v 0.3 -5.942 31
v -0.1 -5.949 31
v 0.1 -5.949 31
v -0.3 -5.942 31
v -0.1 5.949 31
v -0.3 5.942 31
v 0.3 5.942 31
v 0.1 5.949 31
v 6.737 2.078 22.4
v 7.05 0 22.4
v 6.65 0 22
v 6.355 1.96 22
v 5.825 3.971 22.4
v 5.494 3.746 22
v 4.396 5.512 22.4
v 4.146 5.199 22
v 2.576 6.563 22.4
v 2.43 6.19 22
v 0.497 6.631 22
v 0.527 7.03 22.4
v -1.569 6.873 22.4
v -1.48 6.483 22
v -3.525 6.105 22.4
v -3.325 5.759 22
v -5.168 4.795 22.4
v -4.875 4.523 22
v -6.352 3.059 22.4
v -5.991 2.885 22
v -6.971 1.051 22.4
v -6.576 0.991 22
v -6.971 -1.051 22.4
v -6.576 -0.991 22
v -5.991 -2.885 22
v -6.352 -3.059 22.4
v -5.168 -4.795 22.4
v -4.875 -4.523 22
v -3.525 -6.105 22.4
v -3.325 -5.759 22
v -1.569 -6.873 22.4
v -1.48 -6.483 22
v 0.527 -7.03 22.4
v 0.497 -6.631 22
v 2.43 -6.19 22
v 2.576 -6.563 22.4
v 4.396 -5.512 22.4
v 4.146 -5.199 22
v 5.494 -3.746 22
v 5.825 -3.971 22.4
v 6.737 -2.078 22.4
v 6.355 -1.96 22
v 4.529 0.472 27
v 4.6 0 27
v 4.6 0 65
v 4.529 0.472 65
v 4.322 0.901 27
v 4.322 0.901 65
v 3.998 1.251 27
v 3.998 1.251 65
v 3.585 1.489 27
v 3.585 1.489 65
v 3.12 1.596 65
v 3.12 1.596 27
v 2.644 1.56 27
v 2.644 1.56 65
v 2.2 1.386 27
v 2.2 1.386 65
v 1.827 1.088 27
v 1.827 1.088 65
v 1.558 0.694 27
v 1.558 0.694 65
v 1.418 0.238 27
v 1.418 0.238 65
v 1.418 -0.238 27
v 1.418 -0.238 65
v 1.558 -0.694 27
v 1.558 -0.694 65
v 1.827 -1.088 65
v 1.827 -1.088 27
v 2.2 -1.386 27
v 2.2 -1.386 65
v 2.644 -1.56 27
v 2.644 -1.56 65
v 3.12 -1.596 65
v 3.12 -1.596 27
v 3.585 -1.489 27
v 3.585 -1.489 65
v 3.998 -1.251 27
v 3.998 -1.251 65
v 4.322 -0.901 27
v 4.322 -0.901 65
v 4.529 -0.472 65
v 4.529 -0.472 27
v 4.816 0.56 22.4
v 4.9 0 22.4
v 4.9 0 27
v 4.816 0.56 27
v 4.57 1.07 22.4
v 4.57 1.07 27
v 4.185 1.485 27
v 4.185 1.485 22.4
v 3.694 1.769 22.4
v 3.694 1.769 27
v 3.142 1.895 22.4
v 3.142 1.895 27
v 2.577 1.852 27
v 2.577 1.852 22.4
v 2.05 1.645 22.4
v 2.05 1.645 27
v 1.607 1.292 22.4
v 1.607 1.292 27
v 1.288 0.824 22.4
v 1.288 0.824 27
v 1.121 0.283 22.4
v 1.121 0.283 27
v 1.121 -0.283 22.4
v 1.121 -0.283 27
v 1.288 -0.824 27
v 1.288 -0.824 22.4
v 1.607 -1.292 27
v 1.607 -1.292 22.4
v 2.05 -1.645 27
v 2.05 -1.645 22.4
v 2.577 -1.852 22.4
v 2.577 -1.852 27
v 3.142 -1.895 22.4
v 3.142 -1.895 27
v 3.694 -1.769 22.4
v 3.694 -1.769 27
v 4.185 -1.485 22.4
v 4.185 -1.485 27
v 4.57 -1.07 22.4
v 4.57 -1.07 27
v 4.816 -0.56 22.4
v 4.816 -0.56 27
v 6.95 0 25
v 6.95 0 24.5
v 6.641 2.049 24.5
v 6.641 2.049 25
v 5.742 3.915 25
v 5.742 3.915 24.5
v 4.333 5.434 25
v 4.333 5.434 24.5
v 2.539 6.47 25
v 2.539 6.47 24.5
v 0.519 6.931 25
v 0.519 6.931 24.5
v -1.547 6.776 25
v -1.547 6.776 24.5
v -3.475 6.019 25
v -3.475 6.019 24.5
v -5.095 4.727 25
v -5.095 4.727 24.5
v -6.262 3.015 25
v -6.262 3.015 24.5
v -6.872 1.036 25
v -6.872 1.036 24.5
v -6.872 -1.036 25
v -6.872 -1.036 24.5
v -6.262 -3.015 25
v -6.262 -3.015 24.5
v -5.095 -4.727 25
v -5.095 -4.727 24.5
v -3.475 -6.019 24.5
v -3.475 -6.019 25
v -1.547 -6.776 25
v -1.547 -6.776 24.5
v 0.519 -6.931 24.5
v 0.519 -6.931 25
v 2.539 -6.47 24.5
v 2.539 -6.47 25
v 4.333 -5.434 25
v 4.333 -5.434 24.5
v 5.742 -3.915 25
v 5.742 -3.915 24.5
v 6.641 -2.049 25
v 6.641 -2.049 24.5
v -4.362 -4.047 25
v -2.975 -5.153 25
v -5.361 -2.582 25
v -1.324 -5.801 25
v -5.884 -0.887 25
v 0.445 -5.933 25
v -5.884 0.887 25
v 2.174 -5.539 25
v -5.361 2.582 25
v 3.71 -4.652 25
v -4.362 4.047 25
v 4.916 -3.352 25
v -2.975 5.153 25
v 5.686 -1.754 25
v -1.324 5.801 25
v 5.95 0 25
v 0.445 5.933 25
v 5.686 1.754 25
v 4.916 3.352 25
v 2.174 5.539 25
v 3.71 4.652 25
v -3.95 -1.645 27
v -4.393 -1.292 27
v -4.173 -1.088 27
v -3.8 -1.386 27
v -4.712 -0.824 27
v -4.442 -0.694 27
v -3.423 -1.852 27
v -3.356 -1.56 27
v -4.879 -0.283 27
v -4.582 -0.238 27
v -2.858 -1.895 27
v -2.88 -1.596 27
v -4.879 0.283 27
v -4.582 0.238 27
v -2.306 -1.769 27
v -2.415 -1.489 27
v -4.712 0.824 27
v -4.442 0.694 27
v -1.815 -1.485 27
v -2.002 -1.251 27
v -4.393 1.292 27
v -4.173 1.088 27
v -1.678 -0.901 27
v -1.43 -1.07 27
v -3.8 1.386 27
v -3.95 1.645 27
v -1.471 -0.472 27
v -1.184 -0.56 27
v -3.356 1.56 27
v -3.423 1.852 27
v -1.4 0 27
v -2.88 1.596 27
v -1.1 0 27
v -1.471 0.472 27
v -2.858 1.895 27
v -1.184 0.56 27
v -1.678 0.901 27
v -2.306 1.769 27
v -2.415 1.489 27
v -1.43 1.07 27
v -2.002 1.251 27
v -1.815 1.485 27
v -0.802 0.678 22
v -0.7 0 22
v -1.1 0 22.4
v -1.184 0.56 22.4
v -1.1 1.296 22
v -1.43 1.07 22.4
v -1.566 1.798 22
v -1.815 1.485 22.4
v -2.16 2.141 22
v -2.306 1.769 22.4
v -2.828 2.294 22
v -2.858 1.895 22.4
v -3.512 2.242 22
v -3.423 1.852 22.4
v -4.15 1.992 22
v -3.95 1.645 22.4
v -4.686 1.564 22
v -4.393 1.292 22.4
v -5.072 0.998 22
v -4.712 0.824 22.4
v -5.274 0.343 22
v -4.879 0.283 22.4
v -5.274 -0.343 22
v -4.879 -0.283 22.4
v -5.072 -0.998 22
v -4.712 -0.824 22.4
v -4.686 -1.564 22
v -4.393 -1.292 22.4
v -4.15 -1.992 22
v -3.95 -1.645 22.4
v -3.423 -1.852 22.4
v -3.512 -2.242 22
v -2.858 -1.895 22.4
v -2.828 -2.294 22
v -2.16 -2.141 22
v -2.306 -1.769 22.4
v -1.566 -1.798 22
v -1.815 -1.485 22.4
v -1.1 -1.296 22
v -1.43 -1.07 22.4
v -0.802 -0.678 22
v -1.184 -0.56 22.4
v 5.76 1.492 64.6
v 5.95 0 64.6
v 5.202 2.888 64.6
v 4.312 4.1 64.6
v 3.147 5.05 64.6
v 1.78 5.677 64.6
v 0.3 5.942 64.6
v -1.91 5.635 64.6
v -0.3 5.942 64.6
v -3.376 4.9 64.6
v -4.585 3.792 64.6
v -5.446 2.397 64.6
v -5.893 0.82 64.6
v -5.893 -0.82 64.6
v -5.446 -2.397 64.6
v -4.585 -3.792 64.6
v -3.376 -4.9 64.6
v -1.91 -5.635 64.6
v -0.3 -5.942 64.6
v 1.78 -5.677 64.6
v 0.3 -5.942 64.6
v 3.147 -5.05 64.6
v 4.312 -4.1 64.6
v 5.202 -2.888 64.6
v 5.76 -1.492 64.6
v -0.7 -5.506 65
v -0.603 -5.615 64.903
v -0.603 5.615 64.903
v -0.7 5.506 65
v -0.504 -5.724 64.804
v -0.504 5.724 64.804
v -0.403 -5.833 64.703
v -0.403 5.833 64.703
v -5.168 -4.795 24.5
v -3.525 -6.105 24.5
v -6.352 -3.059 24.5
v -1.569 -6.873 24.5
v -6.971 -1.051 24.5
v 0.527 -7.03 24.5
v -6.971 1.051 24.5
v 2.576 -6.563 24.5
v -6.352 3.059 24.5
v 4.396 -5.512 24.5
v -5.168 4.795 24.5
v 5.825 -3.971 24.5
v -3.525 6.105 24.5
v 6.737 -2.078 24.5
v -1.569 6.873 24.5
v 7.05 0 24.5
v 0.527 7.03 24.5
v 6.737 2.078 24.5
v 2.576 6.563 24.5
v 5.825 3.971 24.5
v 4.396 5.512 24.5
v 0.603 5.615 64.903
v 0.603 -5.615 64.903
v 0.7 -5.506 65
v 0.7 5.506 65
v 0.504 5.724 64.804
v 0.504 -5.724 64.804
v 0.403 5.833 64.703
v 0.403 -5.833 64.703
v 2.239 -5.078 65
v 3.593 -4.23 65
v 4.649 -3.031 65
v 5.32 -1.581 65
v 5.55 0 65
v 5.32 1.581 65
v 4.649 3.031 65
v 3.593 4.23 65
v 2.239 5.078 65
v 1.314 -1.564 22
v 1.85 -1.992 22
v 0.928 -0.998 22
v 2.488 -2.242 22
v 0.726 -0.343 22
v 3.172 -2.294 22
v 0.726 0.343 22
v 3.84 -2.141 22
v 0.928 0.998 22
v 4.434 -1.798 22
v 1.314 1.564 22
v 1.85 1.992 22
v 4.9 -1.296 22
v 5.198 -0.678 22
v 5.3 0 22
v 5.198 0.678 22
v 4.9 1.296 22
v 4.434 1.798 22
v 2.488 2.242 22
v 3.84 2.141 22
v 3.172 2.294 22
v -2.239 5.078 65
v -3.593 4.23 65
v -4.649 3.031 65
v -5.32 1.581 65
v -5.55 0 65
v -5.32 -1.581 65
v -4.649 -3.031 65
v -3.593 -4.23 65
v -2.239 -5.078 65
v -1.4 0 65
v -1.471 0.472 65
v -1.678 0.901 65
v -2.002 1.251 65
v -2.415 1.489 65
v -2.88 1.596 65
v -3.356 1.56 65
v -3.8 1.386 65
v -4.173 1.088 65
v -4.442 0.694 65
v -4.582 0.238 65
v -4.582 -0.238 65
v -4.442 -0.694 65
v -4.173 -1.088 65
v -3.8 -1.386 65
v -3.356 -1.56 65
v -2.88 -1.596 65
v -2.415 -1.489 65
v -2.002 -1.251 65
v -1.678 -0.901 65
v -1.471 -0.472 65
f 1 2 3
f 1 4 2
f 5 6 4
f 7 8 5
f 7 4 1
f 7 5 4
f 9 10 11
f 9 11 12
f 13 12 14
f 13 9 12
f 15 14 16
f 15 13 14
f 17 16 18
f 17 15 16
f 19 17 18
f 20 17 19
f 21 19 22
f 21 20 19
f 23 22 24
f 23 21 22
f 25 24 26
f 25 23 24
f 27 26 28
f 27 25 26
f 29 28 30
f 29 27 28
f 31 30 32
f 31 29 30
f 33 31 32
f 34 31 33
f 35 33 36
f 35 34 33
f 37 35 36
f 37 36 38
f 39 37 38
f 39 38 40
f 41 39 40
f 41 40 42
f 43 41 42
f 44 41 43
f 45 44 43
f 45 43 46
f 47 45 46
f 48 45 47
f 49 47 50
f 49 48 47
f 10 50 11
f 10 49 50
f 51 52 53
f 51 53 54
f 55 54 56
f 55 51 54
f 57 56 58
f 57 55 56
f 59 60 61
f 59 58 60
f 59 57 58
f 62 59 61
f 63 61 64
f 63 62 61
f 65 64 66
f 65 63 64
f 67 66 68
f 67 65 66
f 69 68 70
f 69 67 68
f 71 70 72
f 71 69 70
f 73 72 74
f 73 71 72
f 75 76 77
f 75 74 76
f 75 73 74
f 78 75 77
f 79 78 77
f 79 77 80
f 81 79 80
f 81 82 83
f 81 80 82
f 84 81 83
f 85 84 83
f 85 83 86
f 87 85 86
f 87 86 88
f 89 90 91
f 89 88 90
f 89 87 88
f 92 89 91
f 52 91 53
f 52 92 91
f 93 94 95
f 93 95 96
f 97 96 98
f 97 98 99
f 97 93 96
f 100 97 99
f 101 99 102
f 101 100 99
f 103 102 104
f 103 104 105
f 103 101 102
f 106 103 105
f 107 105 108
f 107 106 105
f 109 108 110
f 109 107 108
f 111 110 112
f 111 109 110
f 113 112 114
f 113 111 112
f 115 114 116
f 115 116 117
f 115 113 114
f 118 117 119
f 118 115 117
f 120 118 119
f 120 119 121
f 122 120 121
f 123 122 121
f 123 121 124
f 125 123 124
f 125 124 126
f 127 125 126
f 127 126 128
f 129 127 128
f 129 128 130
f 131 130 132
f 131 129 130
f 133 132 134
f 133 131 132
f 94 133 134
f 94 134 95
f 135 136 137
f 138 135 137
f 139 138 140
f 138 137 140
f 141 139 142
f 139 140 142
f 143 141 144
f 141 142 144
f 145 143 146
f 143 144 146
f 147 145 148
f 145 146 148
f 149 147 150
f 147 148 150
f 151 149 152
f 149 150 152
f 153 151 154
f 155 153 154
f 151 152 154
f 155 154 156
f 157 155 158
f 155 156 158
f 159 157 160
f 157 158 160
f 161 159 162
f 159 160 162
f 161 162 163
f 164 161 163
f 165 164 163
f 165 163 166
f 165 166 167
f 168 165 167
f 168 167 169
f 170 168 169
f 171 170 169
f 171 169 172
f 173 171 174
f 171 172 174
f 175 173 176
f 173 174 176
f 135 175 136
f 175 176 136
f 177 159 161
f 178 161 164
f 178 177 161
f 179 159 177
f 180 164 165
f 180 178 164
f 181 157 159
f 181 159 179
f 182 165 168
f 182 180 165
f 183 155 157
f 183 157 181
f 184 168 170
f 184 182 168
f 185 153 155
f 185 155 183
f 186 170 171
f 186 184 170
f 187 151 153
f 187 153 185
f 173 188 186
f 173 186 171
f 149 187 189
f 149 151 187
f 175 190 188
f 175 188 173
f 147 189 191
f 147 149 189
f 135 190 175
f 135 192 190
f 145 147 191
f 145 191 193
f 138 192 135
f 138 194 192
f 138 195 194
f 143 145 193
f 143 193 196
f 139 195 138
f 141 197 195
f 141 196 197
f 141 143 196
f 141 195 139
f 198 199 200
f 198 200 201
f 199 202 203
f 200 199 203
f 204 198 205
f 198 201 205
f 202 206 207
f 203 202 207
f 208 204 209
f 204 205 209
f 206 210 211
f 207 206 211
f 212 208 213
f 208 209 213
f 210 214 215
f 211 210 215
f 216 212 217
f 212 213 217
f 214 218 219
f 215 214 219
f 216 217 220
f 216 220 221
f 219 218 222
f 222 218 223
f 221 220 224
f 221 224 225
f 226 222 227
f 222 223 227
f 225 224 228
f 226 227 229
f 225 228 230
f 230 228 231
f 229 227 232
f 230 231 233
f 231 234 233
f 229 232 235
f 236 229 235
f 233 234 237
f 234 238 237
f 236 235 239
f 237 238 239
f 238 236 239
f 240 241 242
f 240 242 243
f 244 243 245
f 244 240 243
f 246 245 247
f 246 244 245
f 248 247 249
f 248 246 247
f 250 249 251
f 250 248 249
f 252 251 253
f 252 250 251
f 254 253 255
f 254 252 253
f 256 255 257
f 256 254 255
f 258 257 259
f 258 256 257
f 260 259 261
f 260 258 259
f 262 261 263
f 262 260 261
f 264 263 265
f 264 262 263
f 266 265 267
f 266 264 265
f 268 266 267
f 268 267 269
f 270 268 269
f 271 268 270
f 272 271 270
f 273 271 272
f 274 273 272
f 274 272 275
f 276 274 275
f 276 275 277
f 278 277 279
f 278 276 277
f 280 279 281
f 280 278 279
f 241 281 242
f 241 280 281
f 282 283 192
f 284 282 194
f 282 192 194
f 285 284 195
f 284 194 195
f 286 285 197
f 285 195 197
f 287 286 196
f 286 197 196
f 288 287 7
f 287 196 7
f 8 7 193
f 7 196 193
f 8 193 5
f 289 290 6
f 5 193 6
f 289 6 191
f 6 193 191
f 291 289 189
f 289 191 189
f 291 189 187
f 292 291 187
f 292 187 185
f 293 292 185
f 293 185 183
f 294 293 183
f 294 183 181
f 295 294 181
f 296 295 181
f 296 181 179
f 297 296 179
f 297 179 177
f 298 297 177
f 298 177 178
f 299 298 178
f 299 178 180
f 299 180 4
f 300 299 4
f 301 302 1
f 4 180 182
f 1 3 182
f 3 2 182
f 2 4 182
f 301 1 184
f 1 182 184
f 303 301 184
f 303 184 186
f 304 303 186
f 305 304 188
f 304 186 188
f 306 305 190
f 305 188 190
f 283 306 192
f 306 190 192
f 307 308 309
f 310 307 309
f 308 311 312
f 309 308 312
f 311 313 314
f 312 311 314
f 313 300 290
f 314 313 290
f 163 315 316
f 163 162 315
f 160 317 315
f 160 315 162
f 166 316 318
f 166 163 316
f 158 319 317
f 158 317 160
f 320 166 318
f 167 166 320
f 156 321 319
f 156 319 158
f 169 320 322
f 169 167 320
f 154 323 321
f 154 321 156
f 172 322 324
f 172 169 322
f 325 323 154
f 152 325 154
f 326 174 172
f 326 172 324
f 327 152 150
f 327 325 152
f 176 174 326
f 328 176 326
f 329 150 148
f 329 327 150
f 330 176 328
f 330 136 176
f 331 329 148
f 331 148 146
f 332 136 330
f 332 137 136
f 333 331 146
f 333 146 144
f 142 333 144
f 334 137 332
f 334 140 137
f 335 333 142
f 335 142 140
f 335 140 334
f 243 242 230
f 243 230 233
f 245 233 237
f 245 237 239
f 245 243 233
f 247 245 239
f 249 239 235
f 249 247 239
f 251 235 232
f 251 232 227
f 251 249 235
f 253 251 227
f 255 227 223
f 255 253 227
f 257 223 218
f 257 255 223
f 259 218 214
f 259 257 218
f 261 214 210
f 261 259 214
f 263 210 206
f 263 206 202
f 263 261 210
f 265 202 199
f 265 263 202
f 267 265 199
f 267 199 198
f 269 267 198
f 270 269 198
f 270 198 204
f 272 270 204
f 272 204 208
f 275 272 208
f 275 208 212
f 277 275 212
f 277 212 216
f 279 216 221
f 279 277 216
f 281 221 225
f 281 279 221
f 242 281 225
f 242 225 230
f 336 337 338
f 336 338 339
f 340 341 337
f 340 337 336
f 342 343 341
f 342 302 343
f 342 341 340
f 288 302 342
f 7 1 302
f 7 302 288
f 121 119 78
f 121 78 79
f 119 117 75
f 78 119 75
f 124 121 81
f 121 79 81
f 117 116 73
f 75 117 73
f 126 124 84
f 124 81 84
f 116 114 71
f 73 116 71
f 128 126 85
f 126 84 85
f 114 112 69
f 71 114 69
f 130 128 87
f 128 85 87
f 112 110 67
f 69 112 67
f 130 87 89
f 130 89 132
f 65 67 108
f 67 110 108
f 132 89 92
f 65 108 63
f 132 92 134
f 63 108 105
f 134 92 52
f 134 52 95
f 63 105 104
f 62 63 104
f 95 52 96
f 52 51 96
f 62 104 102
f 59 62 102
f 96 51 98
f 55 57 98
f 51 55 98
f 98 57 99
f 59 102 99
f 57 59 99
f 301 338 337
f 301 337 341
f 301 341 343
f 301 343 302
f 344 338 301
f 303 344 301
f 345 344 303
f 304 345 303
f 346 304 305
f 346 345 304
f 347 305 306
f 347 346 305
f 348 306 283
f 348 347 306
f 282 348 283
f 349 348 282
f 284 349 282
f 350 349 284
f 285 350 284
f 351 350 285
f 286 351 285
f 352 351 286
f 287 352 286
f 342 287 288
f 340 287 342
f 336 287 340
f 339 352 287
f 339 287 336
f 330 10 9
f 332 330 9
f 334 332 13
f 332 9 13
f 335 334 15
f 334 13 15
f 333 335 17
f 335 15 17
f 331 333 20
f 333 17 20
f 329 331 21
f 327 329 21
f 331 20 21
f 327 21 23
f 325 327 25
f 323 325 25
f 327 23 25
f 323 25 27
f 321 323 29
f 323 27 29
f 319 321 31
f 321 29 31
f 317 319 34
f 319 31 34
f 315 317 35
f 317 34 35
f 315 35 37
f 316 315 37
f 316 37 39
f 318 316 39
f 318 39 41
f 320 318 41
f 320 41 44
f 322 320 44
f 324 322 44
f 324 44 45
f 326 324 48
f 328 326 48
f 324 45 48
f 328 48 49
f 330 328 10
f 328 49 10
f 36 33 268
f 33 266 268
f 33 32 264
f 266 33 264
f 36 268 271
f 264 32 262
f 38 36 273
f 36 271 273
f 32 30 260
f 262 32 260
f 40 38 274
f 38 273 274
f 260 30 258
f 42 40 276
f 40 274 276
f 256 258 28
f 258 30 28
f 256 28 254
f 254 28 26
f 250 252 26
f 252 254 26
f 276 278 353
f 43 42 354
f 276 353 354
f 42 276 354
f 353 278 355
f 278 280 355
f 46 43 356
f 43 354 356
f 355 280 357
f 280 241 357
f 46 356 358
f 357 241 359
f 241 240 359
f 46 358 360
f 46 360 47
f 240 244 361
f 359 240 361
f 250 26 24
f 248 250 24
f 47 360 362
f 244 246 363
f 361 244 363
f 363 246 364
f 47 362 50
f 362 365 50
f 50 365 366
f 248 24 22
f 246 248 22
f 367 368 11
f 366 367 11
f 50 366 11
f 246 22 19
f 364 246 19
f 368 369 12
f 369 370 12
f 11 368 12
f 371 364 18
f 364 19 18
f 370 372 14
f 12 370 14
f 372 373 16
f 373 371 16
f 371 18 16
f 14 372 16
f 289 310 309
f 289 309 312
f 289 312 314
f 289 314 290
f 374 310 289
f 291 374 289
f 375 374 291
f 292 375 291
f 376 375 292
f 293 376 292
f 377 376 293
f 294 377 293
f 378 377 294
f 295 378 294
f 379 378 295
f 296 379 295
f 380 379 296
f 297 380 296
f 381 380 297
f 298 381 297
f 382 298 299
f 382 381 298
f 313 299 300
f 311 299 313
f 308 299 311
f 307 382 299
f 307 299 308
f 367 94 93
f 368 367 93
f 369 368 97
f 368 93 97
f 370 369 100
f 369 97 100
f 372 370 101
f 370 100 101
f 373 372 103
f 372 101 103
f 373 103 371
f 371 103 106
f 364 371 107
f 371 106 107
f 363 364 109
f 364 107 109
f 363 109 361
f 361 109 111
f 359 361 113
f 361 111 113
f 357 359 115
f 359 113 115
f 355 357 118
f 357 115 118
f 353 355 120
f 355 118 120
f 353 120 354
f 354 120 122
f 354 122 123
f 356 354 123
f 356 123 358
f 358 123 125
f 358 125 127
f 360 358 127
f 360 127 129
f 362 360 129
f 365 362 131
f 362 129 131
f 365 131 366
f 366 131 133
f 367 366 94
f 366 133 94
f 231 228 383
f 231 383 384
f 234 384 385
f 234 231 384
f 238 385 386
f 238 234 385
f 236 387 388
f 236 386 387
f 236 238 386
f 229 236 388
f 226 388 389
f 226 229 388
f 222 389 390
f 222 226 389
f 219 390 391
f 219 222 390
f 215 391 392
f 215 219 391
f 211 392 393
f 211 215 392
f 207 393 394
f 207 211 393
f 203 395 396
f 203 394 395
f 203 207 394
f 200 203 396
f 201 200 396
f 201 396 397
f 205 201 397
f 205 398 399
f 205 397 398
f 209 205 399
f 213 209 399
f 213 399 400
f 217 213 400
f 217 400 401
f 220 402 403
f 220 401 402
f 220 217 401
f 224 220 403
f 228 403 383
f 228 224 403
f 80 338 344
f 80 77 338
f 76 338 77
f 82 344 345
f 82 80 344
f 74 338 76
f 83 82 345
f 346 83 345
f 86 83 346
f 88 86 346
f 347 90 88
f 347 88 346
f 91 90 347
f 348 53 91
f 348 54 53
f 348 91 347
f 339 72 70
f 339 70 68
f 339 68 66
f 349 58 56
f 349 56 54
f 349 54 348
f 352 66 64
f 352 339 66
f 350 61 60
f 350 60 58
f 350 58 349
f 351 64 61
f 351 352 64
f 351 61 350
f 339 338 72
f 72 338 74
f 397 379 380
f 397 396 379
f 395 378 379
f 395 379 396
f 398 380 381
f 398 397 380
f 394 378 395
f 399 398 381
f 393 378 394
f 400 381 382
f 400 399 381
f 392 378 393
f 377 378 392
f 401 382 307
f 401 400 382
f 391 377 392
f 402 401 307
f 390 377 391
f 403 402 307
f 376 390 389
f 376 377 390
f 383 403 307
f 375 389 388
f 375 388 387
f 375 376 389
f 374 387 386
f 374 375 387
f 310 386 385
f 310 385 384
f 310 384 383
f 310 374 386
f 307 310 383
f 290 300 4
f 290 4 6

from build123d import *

# Parameters (mm, degrees)
SKETCH014_R     = 7.05
PAD004_DEPTH    = 2.5
SKETCH015_R     = 6.95
PAD005_DEPTH    = 0.5
SKETCH016_R     = 5.95
PAD006_DEPTH    = 40
SKETCH018_R     = 1.9
POCKET010_DEPTH = 5
SKETCH019_R     = 1.6
POCKET011_DEPTH = 43.001
SKETCH020_W     = 0.6
SKETCH020_H     = 16
POCKET012_DEPTH = 34
CHAMFER_SIZE    = 0.4
CHAMFER003_SIZE = 0.4


with BuildPart() as part:
    # Sketch014 → Pad004 (new body)
    with BuildSketch(Plane.XY):
        Circle(SKETCH014_R)
    extrude(amount=PAD004_DEPTH)

    # Sketch015 (on DatumPlane) → Pad005 (join)
    with BuildSketch(Plane.XY.offset(2.5)):
        Circle(SKETCH015_R)
    extrude(amount=PAD005_DEPTH)

    # Sketch016 (on DatumPlane) → Pad006 (join)
    with BuildSketch(Plane.XY.offset(3)):
        Circle(SKETCH016_R)
    extrude(amount=PAD006_DEPTH)

    # Sketch018 (on DatumPlane) → Pocket010 (cut)
    with BuildSketch(Plane.XY):
        with Locations((-3, 0)):
            Circle(SKETCH018_R)
        with Locations((3, 0)):
            Circle(SKETCH018_R)
    extrude(amount=POCKET010_DEPTH, mode=Mode.SUBTRACT)

    # Sketch019 (on DatumPlane) → Pocket011 (cut, through all)
    with BuildSketch(Plane.XY):
        with Locations((-3, 0)):
            Circle(SKETCH019_R)
        with Locations((3, 0)):
            Circle(SKETCH019_R)
    extrude(amount=POCKET011_DEPTH, mode=Mode.SUBTRACT)

    # Sketch020 (on DatumPlane) → Pocket012 (cut)
    with BuildSketch(Plane.XY.offset(43)):
        Rectangle(SKETCH020_W, SKETCH020_H)
    extrude(amount=-POCKET012_DEPTH, mode=Mode.SUBTRACT)

    # Chamfer
    chamfer_edges = [part.edges().sort_by_distance(p)[0] for p in [
        (-0.3, 0, 43),
        (-5.95, 0, 43),
        (0.3, 0, 43),
        (4.312047, -4.099848, 43),
        (4.312047, 4.099848, 43),
    ]]
    chamfer(chamfer_edges, length=CHAMFER_SIZE)

    # Chamfer003
    chamfer003_edges = [part.edges().sort_by_distance(p)[0] for p in [
        (-7.05, 0, 0),
        (-4.9, 0, 0),
        (1.1, 0, 0),
    ]]
    chamfer(chamfer003_edges, length=CHAMFER003_SIZE)


with BuildPart() as part_1:
    # Body003 placement: moved
    add(part.part.moved(Location((0, 0, 22))))


solid = part_1.part
